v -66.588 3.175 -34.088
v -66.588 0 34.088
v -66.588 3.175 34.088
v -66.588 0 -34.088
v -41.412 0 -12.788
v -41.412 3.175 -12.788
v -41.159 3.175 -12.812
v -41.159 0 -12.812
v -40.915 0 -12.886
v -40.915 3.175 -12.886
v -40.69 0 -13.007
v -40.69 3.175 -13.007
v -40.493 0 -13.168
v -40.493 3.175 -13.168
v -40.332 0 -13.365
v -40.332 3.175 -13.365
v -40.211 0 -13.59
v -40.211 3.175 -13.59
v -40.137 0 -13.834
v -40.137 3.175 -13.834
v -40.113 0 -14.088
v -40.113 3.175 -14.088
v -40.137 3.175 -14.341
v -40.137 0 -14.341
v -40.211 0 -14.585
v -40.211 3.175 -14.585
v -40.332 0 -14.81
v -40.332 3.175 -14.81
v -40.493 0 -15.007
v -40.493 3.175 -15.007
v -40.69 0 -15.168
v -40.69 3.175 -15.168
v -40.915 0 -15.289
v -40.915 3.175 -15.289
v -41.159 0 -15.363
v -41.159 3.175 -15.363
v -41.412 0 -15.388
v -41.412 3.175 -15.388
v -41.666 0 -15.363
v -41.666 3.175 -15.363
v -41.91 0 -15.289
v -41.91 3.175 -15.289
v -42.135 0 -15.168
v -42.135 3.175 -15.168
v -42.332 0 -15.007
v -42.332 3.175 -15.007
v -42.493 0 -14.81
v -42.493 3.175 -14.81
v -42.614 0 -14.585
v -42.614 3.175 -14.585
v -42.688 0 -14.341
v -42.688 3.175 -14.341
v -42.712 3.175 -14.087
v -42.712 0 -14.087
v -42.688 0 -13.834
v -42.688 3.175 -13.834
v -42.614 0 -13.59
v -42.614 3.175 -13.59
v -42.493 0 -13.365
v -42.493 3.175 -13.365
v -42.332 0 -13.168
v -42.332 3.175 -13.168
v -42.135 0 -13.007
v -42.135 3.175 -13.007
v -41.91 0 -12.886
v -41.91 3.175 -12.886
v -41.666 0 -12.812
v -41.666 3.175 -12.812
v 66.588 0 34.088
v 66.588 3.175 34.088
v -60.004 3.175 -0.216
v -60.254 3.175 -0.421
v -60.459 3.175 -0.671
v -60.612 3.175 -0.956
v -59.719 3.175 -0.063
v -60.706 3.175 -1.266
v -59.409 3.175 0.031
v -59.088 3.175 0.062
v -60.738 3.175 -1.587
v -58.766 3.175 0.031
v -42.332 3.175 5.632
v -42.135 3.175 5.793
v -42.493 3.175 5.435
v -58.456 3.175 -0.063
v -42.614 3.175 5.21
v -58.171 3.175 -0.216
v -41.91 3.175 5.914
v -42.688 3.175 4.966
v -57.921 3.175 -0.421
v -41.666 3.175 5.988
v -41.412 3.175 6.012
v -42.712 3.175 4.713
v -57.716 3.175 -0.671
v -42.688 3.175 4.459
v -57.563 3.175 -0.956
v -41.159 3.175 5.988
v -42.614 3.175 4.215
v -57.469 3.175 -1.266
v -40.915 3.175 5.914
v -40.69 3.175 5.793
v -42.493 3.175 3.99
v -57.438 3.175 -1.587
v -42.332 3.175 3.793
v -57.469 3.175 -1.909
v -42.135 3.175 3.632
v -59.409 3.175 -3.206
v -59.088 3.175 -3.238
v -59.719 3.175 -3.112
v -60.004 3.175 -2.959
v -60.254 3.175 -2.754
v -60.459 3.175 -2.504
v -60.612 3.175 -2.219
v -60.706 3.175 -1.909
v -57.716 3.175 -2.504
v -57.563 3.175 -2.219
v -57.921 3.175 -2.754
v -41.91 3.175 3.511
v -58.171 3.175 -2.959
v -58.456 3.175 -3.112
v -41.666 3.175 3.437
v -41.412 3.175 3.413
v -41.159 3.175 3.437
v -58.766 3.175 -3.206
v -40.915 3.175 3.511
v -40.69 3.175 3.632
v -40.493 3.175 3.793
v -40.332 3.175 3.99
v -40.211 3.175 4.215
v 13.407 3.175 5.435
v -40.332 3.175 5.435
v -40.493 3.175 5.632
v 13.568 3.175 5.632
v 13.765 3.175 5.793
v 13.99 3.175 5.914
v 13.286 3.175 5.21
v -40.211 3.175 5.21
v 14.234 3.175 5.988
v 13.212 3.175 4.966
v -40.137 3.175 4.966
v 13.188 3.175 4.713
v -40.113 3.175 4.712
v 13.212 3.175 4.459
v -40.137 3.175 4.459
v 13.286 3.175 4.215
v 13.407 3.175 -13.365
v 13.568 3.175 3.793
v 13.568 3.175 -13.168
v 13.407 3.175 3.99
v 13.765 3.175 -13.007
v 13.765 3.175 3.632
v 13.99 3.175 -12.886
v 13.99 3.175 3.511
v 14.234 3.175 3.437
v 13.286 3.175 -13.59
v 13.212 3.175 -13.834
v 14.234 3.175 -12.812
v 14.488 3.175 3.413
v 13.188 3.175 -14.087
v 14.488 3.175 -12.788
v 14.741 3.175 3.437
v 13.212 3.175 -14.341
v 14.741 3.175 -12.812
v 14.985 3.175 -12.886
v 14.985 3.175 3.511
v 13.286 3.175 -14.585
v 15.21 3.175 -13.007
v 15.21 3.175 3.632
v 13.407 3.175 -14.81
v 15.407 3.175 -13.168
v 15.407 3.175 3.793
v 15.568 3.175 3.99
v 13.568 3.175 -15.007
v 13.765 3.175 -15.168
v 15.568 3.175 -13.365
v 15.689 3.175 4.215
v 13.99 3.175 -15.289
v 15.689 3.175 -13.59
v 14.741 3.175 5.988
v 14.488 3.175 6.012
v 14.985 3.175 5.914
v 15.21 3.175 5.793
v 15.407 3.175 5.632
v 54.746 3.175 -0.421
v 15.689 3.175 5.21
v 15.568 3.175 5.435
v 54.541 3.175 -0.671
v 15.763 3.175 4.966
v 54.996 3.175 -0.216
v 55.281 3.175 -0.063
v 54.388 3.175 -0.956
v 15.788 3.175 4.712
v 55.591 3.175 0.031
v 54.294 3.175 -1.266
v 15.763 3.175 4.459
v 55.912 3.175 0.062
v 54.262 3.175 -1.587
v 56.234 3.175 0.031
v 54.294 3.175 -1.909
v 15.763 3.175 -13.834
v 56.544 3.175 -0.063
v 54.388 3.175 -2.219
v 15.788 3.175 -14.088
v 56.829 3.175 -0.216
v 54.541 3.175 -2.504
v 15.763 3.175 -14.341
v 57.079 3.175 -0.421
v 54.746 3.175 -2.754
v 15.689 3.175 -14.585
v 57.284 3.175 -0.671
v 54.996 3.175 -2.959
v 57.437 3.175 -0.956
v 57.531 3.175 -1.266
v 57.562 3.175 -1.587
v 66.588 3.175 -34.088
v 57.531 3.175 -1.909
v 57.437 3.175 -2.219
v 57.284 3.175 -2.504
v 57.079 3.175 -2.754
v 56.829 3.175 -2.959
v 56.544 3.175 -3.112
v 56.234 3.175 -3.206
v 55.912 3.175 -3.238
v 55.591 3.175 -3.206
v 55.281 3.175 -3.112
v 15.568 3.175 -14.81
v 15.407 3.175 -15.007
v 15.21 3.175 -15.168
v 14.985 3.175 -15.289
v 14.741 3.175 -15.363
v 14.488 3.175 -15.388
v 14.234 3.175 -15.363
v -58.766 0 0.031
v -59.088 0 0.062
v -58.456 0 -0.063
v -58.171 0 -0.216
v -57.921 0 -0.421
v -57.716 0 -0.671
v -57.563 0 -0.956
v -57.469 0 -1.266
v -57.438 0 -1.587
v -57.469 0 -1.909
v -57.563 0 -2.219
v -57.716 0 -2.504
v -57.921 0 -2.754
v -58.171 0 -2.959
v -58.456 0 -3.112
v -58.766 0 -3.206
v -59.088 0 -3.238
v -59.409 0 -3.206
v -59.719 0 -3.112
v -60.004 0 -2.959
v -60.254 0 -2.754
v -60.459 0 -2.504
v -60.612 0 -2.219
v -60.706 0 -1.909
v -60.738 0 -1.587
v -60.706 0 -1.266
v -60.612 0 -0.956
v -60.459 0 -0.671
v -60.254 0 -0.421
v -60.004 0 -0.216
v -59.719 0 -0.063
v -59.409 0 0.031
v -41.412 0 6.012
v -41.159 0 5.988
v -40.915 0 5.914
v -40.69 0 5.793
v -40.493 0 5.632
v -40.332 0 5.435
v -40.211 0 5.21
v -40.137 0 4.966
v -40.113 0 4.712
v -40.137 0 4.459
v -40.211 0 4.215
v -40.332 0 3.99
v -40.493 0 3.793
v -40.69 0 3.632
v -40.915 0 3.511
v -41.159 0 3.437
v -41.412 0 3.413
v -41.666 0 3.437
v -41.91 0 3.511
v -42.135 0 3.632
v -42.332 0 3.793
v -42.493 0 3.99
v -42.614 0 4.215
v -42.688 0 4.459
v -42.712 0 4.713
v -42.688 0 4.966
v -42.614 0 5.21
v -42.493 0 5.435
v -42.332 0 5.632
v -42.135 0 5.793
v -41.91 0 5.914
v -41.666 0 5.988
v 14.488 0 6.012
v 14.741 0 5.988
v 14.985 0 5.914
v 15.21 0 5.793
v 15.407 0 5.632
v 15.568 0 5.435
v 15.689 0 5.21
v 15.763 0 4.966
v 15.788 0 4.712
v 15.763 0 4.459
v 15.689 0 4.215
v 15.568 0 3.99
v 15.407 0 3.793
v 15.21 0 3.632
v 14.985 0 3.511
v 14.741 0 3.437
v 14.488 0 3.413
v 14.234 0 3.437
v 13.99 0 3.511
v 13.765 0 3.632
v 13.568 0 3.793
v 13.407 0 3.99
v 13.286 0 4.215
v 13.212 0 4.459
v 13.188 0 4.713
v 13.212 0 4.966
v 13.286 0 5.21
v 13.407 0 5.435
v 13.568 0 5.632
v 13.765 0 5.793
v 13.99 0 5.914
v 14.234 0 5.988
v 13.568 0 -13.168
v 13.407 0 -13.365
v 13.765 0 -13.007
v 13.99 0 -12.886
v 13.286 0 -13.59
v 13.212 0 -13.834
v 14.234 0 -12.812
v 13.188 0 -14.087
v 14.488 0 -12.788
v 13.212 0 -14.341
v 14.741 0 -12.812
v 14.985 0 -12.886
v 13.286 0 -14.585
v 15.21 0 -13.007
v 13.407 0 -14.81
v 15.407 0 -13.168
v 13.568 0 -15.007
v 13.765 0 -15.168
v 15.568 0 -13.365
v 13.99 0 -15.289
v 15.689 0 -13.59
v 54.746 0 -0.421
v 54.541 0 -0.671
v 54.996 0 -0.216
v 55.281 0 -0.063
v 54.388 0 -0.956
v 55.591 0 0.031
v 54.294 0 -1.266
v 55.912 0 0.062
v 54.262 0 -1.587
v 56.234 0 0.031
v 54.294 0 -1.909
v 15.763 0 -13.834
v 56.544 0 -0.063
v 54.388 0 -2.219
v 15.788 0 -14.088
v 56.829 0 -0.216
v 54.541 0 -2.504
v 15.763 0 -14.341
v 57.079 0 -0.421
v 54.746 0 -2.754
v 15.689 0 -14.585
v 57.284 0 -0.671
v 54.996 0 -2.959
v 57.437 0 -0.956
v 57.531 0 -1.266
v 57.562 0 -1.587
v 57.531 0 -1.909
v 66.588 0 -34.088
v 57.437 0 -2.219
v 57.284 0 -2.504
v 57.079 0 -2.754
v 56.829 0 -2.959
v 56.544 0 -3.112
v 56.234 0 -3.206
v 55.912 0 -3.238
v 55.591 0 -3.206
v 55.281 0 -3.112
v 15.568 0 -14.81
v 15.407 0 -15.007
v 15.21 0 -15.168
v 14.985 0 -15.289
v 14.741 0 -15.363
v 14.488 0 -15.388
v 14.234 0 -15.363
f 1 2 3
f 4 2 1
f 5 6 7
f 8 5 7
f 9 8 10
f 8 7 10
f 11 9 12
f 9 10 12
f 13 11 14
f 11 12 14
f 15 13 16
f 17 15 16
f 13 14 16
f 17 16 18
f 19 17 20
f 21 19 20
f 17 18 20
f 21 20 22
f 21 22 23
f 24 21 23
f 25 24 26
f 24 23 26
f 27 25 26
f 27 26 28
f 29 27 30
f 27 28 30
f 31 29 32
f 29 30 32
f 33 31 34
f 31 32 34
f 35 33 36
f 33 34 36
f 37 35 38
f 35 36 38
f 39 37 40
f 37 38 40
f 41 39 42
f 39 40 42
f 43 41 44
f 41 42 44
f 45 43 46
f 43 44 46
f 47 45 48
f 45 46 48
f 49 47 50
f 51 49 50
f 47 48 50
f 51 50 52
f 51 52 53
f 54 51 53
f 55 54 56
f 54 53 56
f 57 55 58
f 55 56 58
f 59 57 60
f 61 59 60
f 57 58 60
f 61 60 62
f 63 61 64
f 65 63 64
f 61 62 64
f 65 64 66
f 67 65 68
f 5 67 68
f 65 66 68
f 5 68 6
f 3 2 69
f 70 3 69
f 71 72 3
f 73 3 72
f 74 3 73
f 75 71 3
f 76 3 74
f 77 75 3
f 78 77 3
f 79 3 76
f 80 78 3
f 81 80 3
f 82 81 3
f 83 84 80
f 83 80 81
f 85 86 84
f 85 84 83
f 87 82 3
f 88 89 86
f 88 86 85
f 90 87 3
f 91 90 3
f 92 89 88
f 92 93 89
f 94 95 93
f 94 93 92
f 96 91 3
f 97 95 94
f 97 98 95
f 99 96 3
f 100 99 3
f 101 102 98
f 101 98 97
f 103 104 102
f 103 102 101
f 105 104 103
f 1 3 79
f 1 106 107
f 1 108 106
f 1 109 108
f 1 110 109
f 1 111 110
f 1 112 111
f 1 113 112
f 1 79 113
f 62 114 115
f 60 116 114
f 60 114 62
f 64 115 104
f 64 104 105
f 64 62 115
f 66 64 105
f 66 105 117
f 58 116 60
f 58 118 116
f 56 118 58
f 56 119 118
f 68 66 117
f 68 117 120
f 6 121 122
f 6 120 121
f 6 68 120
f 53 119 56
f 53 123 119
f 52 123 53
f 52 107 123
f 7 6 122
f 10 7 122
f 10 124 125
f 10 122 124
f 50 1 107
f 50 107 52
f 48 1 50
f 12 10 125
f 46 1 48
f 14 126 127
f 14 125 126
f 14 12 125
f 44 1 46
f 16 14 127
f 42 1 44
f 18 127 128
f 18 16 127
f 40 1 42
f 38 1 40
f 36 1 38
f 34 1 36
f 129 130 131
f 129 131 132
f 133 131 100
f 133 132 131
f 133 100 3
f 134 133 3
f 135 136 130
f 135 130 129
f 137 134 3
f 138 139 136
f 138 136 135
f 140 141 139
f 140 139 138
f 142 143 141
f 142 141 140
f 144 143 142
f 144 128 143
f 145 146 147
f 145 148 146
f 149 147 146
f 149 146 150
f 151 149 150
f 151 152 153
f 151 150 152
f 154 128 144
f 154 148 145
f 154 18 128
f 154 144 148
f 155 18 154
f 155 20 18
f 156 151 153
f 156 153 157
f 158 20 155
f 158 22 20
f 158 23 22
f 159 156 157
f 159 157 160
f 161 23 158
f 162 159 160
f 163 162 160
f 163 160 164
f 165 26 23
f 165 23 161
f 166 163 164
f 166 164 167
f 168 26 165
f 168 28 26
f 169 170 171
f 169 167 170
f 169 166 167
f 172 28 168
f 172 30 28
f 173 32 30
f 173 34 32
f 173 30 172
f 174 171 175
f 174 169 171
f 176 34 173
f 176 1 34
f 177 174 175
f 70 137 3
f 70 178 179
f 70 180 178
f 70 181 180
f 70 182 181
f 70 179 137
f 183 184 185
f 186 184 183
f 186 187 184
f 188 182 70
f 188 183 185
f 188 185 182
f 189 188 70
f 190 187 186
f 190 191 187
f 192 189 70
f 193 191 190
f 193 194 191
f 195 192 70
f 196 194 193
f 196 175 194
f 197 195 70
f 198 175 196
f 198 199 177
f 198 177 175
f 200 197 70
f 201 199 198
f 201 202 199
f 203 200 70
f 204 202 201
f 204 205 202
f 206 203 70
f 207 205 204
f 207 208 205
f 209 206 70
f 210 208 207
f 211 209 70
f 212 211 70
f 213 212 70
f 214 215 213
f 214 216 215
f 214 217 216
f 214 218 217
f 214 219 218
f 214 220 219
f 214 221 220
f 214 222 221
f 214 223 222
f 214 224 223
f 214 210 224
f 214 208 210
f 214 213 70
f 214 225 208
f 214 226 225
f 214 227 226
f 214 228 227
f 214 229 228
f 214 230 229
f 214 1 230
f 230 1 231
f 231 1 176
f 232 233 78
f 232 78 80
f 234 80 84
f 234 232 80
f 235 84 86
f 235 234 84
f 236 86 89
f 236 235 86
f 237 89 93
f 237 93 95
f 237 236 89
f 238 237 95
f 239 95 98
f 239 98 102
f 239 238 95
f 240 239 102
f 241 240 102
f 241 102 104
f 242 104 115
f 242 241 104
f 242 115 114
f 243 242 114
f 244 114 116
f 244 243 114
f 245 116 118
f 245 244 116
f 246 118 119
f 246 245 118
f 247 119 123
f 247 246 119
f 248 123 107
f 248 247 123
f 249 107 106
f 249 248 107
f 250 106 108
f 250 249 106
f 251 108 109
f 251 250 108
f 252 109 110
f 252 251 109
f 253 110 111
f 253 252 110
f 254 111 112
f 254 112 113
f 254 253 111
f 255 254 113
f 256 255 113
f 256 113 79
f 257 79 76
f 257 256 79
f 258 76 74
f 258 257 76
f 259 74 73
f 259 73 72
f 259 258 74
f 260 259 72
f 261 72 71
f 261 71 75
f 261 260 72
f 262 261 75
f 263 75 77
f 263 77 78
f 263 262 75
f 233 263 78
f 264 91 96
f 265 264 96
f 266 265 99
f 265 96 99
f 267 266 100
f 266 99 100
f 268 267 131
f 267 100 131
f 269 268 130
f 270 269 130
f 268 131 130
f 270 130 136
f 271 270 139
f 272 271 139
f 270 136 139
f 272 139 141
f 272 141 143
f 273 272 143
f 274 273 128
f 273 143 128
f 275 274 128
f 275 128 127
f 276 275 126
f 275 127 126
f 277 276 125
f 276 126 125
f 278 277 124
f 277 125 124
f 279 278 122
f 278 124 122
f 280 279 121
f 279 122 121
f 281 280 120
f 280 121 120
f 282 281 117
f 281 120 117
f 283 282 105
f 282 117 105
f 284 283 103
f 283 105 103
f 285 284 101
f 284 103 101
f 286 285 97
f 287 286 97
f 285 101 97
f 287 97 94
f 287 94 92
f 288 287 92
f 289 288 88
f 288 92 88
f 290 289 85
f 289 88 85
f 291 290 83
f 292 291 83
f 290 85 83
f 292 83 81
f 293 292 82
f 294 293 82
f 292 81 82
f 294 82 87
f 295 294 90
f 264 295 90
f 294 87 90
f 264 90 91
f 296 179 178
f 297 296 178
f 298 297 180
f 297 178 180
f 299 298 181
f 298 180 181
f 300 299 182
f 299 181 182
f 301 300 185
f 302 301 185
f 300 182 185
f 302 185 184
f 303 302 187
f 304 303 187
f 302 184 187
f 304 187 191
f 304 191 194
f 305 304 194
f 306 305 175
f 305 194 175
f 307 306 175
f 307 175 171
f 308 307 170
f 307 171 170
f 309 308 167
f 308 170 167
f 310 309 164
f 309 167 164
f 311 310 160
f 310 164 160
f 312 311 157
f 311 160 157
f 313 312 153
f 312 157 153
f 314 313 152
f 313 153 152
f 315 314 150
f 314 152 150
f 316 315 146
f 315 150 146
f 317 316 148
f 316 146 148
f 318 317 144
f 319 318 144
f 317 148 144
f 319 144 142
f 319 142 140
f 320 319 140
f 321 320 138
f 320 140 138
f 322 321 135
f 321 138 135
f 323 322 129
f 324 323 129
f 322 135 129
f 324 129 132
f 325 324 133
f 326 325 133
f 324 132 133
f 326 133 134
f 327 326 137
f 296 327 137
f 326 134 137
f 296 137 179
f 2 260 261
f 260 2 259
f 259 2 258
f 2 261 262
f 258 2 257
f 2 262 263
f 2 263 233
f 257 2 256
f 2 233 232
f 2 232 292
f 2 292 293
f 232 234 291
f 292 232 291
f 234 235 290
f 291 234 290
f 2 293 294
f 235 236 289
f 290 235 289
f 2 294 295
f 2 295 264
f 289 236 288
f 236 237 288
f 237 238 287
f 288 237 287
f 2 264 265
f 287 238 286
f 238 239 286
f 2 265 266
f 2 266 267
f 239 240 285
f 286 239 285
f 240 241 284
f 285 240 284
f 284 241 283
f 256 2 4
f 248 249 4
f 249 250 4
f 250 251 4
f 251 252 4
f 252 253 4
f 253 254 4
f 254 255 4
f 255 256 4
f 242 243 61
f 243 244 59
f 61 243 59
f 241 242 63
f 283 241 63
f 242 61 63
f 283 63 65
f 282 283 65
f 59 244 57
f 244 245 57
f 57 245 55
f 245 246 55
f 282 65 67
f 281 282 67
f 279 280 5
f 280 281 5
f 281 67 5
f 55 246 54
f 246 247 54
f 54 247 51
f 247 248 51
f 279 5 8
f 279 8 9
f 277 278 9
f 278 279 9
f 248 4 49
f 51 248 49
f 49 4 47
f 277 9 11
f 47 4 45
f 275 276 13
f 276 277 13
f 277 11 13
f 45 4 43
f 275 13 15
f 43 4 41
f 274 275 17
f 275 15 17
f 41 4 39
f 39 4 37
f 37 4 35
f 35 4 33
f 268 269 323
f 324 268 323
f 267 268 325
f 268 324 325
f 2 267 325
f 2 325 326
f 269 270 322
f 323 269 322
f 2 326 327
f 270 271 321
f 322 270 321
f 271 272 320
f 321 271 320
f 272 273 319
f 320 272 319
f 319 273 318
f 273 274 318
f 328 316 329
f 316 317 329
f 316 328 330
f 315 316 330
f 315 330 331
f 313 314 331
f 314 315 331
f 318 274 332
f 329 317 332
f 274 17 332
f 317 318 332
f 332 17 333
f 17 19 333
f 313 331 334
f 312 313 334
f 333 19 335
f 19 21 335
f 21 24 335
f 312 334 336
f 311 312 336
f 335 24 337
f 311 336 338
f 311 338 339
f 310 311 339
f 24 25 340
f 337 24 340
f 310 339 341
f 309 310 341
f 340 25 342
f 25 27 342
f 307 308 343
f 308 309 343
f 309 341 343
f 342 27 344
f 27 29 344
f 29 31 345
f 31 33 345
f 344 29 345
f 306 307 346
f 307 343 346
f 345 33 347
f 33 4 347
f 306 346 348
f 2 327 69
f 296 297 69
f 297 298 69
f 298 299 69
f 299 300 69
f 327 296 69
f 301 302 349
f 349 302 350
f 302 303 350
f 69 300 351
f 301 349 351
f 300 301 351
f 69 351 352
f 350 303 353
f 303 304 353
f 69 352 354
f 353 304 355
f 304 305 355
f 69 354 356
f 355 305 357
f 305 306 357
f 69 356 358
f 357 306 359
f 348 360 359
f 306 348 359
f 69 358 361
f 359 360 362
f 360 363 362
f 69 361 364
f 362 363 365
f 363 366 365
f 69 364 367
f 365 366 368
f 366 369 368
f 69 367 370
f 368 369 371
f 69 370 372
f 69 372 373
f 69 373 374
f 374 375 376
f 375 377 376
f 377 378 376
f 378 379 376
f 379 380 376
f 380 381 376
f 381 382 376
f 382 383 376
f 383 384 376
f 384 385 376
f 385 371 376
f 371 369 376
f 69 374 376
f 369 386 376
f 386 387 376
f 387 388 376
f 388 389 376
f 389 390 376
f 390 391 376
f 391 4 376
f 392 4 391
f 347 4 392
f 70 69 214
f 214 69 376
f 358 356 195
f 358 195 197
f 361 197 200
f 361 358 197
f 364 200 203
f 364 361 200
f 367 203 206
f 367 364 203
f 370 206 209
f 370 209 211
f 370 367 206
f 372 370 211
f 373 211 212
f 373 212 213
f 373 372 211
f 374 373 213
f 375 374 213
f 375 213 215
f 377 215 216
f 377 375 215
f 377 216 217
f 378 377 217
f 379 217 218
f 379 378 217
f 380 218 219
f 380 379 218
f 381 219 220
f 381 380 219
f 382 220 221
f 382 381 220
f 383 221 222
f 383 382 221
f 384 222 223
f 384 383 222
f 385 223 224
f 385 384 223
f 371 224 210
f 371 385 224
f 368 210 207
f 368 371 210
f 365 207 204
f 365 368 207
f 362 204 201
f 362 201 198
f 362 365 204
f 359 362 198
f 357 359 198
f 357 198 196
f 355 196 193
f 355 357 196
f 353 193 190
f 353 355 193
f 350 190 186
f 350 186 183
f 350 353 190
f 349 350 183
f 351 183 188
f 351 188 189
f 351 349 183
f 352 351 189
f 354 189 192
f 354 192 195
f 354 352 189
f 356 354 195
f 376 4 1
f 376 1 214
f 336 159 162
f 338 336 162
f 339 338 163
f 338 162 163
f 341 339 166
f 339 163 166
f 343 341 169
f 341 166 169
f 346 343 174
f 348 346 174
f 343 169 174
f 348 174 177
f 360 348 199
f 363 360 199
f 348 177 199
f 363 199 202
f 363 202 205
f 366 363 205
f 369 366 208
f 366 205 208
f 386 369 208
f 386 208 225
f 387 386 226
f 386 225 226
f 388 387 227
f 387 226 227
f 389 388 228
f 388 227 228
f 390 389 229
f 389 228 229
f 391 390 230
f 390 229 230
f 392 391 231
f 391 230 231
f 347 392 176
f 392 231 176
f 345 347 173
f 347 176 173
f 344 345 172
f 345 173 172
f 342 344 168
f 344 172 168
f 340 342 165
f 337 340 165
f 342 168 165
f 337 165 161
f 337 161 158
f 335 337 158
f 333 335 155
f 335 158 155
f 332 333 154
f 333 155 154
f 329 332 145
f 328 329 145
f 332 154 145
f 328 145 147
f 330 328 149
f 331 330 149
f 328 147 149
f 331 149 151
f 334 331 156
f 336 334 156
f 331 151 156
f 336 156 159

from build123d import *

# Parameters (mm, degrees)
SKETCH1_W           = 133.175
SKETCH1_H           = 68.175
SKETCH1_R           = 1.65
BOSS_EXTRUDE1_DEPTH = 3.175
SKETCH2_R           = 1.3
CUT_EXTRUDE1_DEPTH  = 3.175


with BuildPart() as part:
    # Sketch1 → Boss-Extrude1 (new body)
    with BuildSketch(Plane(origin=(0, 0, 0), x_dir=(1, 0, 0), z_dir=(0, 1, 0))):
        Rectangle(SKETCH1_W, SKETCH1_H)
        with Locations(Location((-59.0875, 1.5875, 0), (0, 0, 270))):
            Circle(SKETCH1_R, mode=Mode.SUBTRACT)
        with Locations(Location((55.9125, 1.5875, 0), (0, 0, 270))):
            Circle(SKETCH1_R, mode=Mode.SUBTRACT)
    extrude(amount=BOSS_EXTRUDE1_DEPTH)

    # Sketch2 → Cut-Extrude1 (cut)
    with BuildSketch(Plane(origin=(0, 3.175, 0), x_dir=(1, 0, 0), z_dir=(0, 1, 0))):
        with Locations(Location((14.4875, -4.7125, 0), (0, 0, 270))):
            Circle(SKETCH2_R)
        with Locations(Location((-41.4125, -4.7125, 0), (0, 0, 270))):
            Circle(SKETCH2_R)
        with Locations(Location((-41.4125, 14.0875, 0), (0, 0, 270))):
            Circle(SKETCH2_R)
        with Locations(Location((14.4875, 14.0875, 0), (0, 0, 270))):
            Circle(SKETCH2_R)
    extrude(amount=-CUT_EXTRUDE1_DEPTH, mode=Mode.SUBTRACT)


solid = part.part
